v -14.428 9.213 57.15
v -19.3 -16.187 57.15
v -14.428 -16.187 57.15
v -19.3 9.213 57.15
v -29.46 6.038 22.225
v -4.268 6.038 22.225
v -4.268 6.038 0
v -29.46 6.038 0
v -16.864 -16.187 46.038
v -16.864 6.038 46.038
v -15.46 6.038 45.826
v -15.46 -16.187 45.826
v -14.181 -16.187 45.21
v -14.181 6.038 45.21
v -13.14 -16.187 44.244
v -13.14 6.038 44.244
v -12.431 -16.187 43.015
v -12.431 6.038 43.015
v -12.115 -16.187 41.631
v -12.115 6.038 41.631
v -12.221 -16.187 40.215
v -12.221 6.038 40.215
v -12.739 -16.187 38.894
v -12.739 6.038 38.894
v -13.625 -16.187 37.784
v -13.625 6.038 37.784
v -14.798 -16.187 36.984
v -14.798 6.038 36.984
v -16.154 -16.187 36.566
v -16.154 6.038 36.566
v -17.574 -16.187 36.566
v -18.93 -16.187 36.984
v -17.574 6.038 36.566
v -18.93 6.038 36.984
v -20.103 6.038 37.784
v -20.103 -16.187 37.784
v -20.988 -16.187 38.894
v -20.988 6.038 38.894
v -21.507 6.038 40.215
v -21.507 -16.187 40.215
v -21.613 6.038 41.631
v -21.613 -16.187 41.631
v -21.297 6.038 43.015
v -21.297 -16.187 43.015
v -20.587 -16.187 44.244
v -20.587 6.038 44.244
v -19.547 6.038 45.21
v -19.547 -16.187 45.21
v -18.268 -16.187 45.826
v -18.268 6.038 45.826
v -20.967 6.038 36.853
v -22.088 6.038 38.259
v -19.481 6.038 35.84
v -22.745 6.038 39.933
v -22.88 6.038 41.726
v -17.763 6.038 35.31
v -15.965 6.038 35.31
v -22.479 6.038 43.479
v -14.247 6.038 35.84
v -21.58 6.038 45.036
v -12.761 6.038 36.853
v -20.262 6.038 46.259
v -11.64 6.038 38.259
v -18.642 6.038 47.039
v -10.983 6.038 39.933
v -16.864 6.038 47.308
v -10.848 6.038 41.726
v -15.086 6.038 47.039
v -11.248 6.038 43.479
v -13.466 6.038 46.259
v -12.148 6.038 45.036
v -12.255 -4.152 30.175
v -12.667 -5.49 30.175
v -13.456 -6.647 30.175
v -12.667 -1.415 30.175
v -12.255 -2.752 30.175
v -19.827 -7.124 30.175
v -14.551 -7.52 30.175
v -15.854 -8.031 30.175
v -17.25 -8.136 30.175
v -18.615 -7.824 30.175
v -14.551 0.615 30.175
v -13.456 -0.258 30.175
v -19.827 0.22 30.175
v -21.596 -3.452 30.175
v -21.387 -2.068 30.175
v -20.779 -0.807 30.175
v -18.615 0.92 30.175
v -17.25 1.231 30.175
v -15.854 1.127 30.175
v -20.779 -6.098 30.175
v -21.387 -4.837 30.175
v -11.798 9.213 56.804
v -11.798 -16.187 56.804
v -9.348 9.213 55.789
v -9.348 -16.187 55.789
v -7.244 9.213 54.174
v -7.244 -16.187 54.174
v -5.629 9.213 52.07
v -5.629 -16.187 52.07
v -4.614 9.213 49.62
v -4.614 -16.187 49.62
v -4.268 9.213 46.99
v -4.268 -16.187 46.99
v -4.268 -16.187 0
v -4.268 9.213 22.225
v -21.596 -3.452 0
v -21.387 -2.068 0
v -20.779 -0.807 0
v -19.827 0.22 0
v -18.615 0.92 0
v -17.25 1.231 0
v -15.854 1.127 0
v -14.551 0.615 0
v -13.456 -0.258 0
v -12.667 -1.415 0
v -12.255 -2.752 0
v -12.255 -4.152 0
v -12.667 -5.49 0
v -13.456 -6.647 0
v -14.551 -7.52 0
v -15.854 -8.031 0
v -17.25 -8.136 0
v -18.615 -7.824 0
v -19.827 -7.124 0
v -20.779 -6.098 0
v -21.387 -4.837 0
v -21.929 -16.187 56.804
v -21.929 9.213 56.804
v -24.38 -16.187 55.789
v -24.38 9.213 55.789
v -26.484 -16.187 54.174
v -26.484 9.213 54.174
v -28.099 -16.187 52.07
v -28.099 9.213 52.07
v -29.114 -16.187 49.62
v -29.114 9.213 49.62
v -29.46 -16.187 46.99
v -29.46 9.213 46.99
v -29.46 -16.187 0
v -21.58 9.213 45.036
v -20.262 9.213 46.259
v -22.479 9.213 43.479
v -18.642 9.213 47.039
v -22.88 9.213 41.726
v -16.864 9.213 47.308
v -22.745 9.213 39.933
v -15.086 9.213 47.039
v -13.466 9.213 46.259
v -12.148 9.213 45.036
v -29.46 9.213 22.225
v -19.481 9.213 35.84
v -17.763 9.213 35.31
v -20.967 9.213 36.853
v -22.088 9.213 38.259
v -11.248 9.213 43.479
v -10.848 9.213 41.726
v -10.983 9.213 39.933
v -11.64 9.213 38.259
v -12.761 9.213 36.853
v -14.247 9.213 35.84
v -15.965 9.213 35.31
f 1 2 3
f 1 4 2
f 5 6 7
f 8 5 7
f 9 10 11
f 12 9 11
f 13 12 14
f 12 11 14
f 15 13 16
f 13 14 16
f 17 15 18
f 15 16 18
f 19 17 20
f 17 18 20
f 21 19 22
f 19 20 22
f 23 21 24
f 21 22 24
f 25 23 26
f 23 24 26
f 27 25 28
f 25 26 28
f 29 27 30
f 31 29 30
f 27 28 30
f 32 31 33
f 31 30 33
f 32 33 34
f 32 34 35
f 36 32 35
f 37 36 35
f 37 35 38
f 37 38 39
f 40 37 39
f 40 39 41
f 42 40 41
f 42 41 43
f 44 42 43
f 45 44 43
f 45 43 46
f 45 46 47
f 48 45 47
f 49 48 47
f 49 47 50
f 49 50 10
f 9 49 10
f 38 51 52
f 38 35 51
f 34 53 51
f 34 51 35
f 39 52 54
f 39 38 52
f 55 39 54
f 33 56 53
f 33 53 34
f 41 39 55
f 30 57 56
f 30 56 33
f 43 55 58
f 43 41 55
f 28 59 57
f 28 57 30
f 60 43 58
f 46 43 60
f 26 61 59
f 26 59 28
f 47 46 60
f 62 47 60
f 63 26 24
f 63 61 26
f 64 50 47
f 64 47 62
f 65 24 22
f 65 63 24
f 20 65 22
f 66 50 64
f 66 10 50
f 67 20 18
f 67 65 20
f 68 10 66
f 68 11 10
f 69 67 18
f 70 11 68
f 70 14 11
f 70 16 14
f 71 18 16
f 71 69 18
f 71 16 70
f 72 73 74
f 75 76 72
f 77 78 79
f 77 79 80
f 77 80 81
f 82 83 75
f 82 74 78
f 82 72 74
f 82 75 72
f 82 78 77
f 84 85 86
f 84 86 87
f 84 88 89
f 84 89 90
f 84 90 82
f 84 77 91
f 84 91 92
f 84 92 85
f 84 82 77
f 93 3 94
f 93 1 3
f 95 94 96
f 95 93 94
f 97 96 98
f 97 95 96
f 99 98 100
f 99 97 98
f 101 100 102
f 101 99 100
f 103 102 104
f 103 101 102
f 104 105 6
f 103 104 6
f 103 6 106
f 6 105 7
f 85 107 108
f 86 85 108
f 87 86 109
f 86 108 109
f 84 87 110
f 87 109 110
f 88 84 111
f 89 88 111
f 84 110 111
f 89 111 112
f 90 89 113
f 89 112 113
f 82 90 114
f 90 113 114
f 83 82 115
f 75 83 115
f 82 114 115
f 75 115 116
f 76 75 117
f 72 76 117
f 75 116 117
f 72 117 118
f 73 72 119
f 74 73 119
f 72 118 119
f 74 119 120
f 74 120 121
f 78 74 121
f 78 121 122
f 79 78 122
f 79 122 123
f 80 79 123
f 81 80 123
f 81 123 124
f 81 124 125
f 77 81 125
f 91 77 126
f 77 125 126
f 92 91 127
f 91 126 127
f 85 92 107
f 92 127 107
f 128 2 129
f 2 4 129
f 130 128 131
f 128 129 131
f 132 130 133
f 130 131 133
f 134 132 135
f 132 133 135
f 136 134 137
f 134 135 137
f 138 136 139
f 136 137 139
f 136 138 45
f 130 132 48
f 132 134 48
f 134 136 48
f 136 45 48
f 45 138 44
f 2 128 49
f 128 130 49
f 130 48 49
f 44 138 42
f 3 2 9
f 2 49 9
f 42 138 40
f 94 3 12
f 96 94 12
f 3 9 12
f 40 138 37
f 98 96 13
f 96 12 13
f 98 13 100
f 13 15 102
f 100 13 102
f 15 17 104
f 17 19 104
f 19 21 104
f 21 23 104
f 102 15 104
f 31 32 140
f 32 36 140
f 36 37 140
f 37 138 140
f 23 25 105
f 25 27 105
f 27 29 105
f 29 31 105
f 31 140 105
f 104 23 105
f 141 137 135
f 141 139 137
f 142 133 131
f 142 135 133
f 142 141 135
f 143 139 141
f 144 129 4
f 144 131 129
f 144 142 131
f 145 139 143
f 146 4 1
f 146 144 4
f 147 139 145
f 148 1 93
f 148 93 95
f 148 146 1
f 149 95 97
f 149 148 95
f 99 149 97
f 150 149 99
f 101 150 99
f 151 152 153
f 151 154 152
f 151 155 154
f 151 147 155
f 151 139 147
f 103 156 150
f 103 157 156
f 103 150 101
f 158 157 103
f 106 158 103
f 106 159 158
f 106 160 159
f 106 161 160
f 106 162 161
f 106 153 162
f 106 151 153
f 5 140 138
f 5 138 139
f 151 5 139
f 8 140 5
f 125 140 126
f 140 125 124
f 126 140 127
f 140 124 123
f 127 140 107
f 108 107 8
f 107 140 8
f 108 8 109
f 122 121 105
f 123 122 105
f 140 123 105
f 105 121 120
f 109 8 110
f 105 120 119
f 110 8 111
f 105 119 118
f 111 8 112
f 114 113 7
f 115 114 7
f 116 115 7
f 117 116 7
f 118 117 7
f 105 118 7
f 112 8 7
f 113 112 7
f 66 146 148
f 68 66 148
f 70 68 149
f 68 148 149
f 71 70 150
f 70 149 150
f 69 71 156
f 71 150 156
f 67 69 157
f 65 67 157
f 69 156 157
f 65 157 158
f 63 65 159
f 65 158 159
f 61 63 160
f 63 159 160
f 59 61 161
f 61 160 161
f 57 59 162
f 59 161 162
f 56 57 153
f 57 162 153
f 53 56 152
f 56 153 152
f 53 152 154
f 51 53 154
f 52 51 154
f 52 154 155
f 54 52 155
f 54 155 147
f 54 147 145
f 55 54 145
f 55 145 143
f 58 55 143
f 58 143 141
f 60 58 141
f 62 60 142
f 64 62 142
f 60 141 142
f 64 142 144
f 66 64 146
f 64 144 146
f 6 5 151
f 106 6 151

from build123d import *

# Parameters (mm, degrees)
SKETCH1_W           = 25.191803279
SKETCH1_H           = 25.4
BOSS_EXTRUDE1_DEPTH = 57.15
SKETCH2_R           = 4.696654448
CUT_EXTRUDE1_DEPTH  = 30.1752
SKETCH3_W           = 22.225
SKETCH3_H           = 3.175
CUT_EXTRUDE2_DEPTH  = 30.1752
SKETCH11_R          = 6.0325
CUT_EXTRUDE5_DEPTH  = 3.175
SKETCH12_R          = 4.7625
CUT_EXTRUDE6_DEPTH  = 69.029075152
FILLET1_R           = 10.16
FILLET2_R           = 10.16


with BuildPart() as part:
    # Sketch1 → Boss-Extrude1 (new body)
    with BuildSketch(Plane.XY):
        with Locations((-16.863934427, -3.487295082)):
            Rectangle(SKETCH1_W, SKETCH1_H)
    extrude(amount=BOSS_EXTRUDE1_DEPTH)

    # Sketch2 → Cut-Extrude1 (cut)
    with BuildSketch(Plane(origin=(0, 0, 0), x_dir=(-1, 0, 0), z_dir=(0, 0, -1))):
        with Locations((16.89886731, -3.452362198)):
            Circle(SKETCH2_R)
    extrude(amount=-CUT_EXTRUDE1_DEPTH, mode=Mode.SUBTRACT)

    # Sketch3 → Cut-Extrude2 (cut)
    with BuildSketch(Plane(origin=(-4.268032787, 0, 0), x_dir=(0, 0, -1), z_dir=(1, 0, 0))):
        with Locations((-11.1125, 7.625204918)):
            Rectangle(SKETCH3_W, SKETCH3_H)
    extrude(amount=-CUT_EXTRUDE2_DEPTH, mode=Mode.SUBTRACT)

    # Sketch11 → Cut-Extrude5 (cut)
    with BuildSketch(Plane(origin=(0, 9.212704918, 0), x_dir=(1, 0, 0), z_dir=(0, 1, 0))):
        with Locations(Location((-16.863934426, -41.275, 0), (0, 0, 270))):
            Circle(SKETCH11_R)
    extrude(amount=-CUT_EXTRUDE5_DEPTH, mode=Mode.SUBTRACT)

    # Sketch12 → Cut-Extrude6 (cut, through all)
    with BuildSketch(Plane(origin=(0, 6.037704918, 0), x_dir=(1, 0, 0), z_dir=(0, 1, 0))):
        with Locations(Location((-16.863934426, -41.275, 0), (0, 0, 270))):
            Circle(SKETCH12_R)
    extrude(amount=-CUT_EXTRUDE6_DEPTH, mode=Mode.SUBTRACT)

    # Fillet1
    fillet1_edges = [part.edges().sort_by_distance(p)[0] for p in [
        (-4.268032787, -3.487295082, 57.15),
    ]]
    fillet(fillet1_edges, radius=FILLET1_R)

    # Fillet2
    fillet2_edges = [part.edges().sort_by_distance(p)[0] for p in [
        (-29.459836066, -3.487295082, 57.15),
    ]]
    fillet(fillet2_edges, radius=FILLET2_R)


solid = part.part
